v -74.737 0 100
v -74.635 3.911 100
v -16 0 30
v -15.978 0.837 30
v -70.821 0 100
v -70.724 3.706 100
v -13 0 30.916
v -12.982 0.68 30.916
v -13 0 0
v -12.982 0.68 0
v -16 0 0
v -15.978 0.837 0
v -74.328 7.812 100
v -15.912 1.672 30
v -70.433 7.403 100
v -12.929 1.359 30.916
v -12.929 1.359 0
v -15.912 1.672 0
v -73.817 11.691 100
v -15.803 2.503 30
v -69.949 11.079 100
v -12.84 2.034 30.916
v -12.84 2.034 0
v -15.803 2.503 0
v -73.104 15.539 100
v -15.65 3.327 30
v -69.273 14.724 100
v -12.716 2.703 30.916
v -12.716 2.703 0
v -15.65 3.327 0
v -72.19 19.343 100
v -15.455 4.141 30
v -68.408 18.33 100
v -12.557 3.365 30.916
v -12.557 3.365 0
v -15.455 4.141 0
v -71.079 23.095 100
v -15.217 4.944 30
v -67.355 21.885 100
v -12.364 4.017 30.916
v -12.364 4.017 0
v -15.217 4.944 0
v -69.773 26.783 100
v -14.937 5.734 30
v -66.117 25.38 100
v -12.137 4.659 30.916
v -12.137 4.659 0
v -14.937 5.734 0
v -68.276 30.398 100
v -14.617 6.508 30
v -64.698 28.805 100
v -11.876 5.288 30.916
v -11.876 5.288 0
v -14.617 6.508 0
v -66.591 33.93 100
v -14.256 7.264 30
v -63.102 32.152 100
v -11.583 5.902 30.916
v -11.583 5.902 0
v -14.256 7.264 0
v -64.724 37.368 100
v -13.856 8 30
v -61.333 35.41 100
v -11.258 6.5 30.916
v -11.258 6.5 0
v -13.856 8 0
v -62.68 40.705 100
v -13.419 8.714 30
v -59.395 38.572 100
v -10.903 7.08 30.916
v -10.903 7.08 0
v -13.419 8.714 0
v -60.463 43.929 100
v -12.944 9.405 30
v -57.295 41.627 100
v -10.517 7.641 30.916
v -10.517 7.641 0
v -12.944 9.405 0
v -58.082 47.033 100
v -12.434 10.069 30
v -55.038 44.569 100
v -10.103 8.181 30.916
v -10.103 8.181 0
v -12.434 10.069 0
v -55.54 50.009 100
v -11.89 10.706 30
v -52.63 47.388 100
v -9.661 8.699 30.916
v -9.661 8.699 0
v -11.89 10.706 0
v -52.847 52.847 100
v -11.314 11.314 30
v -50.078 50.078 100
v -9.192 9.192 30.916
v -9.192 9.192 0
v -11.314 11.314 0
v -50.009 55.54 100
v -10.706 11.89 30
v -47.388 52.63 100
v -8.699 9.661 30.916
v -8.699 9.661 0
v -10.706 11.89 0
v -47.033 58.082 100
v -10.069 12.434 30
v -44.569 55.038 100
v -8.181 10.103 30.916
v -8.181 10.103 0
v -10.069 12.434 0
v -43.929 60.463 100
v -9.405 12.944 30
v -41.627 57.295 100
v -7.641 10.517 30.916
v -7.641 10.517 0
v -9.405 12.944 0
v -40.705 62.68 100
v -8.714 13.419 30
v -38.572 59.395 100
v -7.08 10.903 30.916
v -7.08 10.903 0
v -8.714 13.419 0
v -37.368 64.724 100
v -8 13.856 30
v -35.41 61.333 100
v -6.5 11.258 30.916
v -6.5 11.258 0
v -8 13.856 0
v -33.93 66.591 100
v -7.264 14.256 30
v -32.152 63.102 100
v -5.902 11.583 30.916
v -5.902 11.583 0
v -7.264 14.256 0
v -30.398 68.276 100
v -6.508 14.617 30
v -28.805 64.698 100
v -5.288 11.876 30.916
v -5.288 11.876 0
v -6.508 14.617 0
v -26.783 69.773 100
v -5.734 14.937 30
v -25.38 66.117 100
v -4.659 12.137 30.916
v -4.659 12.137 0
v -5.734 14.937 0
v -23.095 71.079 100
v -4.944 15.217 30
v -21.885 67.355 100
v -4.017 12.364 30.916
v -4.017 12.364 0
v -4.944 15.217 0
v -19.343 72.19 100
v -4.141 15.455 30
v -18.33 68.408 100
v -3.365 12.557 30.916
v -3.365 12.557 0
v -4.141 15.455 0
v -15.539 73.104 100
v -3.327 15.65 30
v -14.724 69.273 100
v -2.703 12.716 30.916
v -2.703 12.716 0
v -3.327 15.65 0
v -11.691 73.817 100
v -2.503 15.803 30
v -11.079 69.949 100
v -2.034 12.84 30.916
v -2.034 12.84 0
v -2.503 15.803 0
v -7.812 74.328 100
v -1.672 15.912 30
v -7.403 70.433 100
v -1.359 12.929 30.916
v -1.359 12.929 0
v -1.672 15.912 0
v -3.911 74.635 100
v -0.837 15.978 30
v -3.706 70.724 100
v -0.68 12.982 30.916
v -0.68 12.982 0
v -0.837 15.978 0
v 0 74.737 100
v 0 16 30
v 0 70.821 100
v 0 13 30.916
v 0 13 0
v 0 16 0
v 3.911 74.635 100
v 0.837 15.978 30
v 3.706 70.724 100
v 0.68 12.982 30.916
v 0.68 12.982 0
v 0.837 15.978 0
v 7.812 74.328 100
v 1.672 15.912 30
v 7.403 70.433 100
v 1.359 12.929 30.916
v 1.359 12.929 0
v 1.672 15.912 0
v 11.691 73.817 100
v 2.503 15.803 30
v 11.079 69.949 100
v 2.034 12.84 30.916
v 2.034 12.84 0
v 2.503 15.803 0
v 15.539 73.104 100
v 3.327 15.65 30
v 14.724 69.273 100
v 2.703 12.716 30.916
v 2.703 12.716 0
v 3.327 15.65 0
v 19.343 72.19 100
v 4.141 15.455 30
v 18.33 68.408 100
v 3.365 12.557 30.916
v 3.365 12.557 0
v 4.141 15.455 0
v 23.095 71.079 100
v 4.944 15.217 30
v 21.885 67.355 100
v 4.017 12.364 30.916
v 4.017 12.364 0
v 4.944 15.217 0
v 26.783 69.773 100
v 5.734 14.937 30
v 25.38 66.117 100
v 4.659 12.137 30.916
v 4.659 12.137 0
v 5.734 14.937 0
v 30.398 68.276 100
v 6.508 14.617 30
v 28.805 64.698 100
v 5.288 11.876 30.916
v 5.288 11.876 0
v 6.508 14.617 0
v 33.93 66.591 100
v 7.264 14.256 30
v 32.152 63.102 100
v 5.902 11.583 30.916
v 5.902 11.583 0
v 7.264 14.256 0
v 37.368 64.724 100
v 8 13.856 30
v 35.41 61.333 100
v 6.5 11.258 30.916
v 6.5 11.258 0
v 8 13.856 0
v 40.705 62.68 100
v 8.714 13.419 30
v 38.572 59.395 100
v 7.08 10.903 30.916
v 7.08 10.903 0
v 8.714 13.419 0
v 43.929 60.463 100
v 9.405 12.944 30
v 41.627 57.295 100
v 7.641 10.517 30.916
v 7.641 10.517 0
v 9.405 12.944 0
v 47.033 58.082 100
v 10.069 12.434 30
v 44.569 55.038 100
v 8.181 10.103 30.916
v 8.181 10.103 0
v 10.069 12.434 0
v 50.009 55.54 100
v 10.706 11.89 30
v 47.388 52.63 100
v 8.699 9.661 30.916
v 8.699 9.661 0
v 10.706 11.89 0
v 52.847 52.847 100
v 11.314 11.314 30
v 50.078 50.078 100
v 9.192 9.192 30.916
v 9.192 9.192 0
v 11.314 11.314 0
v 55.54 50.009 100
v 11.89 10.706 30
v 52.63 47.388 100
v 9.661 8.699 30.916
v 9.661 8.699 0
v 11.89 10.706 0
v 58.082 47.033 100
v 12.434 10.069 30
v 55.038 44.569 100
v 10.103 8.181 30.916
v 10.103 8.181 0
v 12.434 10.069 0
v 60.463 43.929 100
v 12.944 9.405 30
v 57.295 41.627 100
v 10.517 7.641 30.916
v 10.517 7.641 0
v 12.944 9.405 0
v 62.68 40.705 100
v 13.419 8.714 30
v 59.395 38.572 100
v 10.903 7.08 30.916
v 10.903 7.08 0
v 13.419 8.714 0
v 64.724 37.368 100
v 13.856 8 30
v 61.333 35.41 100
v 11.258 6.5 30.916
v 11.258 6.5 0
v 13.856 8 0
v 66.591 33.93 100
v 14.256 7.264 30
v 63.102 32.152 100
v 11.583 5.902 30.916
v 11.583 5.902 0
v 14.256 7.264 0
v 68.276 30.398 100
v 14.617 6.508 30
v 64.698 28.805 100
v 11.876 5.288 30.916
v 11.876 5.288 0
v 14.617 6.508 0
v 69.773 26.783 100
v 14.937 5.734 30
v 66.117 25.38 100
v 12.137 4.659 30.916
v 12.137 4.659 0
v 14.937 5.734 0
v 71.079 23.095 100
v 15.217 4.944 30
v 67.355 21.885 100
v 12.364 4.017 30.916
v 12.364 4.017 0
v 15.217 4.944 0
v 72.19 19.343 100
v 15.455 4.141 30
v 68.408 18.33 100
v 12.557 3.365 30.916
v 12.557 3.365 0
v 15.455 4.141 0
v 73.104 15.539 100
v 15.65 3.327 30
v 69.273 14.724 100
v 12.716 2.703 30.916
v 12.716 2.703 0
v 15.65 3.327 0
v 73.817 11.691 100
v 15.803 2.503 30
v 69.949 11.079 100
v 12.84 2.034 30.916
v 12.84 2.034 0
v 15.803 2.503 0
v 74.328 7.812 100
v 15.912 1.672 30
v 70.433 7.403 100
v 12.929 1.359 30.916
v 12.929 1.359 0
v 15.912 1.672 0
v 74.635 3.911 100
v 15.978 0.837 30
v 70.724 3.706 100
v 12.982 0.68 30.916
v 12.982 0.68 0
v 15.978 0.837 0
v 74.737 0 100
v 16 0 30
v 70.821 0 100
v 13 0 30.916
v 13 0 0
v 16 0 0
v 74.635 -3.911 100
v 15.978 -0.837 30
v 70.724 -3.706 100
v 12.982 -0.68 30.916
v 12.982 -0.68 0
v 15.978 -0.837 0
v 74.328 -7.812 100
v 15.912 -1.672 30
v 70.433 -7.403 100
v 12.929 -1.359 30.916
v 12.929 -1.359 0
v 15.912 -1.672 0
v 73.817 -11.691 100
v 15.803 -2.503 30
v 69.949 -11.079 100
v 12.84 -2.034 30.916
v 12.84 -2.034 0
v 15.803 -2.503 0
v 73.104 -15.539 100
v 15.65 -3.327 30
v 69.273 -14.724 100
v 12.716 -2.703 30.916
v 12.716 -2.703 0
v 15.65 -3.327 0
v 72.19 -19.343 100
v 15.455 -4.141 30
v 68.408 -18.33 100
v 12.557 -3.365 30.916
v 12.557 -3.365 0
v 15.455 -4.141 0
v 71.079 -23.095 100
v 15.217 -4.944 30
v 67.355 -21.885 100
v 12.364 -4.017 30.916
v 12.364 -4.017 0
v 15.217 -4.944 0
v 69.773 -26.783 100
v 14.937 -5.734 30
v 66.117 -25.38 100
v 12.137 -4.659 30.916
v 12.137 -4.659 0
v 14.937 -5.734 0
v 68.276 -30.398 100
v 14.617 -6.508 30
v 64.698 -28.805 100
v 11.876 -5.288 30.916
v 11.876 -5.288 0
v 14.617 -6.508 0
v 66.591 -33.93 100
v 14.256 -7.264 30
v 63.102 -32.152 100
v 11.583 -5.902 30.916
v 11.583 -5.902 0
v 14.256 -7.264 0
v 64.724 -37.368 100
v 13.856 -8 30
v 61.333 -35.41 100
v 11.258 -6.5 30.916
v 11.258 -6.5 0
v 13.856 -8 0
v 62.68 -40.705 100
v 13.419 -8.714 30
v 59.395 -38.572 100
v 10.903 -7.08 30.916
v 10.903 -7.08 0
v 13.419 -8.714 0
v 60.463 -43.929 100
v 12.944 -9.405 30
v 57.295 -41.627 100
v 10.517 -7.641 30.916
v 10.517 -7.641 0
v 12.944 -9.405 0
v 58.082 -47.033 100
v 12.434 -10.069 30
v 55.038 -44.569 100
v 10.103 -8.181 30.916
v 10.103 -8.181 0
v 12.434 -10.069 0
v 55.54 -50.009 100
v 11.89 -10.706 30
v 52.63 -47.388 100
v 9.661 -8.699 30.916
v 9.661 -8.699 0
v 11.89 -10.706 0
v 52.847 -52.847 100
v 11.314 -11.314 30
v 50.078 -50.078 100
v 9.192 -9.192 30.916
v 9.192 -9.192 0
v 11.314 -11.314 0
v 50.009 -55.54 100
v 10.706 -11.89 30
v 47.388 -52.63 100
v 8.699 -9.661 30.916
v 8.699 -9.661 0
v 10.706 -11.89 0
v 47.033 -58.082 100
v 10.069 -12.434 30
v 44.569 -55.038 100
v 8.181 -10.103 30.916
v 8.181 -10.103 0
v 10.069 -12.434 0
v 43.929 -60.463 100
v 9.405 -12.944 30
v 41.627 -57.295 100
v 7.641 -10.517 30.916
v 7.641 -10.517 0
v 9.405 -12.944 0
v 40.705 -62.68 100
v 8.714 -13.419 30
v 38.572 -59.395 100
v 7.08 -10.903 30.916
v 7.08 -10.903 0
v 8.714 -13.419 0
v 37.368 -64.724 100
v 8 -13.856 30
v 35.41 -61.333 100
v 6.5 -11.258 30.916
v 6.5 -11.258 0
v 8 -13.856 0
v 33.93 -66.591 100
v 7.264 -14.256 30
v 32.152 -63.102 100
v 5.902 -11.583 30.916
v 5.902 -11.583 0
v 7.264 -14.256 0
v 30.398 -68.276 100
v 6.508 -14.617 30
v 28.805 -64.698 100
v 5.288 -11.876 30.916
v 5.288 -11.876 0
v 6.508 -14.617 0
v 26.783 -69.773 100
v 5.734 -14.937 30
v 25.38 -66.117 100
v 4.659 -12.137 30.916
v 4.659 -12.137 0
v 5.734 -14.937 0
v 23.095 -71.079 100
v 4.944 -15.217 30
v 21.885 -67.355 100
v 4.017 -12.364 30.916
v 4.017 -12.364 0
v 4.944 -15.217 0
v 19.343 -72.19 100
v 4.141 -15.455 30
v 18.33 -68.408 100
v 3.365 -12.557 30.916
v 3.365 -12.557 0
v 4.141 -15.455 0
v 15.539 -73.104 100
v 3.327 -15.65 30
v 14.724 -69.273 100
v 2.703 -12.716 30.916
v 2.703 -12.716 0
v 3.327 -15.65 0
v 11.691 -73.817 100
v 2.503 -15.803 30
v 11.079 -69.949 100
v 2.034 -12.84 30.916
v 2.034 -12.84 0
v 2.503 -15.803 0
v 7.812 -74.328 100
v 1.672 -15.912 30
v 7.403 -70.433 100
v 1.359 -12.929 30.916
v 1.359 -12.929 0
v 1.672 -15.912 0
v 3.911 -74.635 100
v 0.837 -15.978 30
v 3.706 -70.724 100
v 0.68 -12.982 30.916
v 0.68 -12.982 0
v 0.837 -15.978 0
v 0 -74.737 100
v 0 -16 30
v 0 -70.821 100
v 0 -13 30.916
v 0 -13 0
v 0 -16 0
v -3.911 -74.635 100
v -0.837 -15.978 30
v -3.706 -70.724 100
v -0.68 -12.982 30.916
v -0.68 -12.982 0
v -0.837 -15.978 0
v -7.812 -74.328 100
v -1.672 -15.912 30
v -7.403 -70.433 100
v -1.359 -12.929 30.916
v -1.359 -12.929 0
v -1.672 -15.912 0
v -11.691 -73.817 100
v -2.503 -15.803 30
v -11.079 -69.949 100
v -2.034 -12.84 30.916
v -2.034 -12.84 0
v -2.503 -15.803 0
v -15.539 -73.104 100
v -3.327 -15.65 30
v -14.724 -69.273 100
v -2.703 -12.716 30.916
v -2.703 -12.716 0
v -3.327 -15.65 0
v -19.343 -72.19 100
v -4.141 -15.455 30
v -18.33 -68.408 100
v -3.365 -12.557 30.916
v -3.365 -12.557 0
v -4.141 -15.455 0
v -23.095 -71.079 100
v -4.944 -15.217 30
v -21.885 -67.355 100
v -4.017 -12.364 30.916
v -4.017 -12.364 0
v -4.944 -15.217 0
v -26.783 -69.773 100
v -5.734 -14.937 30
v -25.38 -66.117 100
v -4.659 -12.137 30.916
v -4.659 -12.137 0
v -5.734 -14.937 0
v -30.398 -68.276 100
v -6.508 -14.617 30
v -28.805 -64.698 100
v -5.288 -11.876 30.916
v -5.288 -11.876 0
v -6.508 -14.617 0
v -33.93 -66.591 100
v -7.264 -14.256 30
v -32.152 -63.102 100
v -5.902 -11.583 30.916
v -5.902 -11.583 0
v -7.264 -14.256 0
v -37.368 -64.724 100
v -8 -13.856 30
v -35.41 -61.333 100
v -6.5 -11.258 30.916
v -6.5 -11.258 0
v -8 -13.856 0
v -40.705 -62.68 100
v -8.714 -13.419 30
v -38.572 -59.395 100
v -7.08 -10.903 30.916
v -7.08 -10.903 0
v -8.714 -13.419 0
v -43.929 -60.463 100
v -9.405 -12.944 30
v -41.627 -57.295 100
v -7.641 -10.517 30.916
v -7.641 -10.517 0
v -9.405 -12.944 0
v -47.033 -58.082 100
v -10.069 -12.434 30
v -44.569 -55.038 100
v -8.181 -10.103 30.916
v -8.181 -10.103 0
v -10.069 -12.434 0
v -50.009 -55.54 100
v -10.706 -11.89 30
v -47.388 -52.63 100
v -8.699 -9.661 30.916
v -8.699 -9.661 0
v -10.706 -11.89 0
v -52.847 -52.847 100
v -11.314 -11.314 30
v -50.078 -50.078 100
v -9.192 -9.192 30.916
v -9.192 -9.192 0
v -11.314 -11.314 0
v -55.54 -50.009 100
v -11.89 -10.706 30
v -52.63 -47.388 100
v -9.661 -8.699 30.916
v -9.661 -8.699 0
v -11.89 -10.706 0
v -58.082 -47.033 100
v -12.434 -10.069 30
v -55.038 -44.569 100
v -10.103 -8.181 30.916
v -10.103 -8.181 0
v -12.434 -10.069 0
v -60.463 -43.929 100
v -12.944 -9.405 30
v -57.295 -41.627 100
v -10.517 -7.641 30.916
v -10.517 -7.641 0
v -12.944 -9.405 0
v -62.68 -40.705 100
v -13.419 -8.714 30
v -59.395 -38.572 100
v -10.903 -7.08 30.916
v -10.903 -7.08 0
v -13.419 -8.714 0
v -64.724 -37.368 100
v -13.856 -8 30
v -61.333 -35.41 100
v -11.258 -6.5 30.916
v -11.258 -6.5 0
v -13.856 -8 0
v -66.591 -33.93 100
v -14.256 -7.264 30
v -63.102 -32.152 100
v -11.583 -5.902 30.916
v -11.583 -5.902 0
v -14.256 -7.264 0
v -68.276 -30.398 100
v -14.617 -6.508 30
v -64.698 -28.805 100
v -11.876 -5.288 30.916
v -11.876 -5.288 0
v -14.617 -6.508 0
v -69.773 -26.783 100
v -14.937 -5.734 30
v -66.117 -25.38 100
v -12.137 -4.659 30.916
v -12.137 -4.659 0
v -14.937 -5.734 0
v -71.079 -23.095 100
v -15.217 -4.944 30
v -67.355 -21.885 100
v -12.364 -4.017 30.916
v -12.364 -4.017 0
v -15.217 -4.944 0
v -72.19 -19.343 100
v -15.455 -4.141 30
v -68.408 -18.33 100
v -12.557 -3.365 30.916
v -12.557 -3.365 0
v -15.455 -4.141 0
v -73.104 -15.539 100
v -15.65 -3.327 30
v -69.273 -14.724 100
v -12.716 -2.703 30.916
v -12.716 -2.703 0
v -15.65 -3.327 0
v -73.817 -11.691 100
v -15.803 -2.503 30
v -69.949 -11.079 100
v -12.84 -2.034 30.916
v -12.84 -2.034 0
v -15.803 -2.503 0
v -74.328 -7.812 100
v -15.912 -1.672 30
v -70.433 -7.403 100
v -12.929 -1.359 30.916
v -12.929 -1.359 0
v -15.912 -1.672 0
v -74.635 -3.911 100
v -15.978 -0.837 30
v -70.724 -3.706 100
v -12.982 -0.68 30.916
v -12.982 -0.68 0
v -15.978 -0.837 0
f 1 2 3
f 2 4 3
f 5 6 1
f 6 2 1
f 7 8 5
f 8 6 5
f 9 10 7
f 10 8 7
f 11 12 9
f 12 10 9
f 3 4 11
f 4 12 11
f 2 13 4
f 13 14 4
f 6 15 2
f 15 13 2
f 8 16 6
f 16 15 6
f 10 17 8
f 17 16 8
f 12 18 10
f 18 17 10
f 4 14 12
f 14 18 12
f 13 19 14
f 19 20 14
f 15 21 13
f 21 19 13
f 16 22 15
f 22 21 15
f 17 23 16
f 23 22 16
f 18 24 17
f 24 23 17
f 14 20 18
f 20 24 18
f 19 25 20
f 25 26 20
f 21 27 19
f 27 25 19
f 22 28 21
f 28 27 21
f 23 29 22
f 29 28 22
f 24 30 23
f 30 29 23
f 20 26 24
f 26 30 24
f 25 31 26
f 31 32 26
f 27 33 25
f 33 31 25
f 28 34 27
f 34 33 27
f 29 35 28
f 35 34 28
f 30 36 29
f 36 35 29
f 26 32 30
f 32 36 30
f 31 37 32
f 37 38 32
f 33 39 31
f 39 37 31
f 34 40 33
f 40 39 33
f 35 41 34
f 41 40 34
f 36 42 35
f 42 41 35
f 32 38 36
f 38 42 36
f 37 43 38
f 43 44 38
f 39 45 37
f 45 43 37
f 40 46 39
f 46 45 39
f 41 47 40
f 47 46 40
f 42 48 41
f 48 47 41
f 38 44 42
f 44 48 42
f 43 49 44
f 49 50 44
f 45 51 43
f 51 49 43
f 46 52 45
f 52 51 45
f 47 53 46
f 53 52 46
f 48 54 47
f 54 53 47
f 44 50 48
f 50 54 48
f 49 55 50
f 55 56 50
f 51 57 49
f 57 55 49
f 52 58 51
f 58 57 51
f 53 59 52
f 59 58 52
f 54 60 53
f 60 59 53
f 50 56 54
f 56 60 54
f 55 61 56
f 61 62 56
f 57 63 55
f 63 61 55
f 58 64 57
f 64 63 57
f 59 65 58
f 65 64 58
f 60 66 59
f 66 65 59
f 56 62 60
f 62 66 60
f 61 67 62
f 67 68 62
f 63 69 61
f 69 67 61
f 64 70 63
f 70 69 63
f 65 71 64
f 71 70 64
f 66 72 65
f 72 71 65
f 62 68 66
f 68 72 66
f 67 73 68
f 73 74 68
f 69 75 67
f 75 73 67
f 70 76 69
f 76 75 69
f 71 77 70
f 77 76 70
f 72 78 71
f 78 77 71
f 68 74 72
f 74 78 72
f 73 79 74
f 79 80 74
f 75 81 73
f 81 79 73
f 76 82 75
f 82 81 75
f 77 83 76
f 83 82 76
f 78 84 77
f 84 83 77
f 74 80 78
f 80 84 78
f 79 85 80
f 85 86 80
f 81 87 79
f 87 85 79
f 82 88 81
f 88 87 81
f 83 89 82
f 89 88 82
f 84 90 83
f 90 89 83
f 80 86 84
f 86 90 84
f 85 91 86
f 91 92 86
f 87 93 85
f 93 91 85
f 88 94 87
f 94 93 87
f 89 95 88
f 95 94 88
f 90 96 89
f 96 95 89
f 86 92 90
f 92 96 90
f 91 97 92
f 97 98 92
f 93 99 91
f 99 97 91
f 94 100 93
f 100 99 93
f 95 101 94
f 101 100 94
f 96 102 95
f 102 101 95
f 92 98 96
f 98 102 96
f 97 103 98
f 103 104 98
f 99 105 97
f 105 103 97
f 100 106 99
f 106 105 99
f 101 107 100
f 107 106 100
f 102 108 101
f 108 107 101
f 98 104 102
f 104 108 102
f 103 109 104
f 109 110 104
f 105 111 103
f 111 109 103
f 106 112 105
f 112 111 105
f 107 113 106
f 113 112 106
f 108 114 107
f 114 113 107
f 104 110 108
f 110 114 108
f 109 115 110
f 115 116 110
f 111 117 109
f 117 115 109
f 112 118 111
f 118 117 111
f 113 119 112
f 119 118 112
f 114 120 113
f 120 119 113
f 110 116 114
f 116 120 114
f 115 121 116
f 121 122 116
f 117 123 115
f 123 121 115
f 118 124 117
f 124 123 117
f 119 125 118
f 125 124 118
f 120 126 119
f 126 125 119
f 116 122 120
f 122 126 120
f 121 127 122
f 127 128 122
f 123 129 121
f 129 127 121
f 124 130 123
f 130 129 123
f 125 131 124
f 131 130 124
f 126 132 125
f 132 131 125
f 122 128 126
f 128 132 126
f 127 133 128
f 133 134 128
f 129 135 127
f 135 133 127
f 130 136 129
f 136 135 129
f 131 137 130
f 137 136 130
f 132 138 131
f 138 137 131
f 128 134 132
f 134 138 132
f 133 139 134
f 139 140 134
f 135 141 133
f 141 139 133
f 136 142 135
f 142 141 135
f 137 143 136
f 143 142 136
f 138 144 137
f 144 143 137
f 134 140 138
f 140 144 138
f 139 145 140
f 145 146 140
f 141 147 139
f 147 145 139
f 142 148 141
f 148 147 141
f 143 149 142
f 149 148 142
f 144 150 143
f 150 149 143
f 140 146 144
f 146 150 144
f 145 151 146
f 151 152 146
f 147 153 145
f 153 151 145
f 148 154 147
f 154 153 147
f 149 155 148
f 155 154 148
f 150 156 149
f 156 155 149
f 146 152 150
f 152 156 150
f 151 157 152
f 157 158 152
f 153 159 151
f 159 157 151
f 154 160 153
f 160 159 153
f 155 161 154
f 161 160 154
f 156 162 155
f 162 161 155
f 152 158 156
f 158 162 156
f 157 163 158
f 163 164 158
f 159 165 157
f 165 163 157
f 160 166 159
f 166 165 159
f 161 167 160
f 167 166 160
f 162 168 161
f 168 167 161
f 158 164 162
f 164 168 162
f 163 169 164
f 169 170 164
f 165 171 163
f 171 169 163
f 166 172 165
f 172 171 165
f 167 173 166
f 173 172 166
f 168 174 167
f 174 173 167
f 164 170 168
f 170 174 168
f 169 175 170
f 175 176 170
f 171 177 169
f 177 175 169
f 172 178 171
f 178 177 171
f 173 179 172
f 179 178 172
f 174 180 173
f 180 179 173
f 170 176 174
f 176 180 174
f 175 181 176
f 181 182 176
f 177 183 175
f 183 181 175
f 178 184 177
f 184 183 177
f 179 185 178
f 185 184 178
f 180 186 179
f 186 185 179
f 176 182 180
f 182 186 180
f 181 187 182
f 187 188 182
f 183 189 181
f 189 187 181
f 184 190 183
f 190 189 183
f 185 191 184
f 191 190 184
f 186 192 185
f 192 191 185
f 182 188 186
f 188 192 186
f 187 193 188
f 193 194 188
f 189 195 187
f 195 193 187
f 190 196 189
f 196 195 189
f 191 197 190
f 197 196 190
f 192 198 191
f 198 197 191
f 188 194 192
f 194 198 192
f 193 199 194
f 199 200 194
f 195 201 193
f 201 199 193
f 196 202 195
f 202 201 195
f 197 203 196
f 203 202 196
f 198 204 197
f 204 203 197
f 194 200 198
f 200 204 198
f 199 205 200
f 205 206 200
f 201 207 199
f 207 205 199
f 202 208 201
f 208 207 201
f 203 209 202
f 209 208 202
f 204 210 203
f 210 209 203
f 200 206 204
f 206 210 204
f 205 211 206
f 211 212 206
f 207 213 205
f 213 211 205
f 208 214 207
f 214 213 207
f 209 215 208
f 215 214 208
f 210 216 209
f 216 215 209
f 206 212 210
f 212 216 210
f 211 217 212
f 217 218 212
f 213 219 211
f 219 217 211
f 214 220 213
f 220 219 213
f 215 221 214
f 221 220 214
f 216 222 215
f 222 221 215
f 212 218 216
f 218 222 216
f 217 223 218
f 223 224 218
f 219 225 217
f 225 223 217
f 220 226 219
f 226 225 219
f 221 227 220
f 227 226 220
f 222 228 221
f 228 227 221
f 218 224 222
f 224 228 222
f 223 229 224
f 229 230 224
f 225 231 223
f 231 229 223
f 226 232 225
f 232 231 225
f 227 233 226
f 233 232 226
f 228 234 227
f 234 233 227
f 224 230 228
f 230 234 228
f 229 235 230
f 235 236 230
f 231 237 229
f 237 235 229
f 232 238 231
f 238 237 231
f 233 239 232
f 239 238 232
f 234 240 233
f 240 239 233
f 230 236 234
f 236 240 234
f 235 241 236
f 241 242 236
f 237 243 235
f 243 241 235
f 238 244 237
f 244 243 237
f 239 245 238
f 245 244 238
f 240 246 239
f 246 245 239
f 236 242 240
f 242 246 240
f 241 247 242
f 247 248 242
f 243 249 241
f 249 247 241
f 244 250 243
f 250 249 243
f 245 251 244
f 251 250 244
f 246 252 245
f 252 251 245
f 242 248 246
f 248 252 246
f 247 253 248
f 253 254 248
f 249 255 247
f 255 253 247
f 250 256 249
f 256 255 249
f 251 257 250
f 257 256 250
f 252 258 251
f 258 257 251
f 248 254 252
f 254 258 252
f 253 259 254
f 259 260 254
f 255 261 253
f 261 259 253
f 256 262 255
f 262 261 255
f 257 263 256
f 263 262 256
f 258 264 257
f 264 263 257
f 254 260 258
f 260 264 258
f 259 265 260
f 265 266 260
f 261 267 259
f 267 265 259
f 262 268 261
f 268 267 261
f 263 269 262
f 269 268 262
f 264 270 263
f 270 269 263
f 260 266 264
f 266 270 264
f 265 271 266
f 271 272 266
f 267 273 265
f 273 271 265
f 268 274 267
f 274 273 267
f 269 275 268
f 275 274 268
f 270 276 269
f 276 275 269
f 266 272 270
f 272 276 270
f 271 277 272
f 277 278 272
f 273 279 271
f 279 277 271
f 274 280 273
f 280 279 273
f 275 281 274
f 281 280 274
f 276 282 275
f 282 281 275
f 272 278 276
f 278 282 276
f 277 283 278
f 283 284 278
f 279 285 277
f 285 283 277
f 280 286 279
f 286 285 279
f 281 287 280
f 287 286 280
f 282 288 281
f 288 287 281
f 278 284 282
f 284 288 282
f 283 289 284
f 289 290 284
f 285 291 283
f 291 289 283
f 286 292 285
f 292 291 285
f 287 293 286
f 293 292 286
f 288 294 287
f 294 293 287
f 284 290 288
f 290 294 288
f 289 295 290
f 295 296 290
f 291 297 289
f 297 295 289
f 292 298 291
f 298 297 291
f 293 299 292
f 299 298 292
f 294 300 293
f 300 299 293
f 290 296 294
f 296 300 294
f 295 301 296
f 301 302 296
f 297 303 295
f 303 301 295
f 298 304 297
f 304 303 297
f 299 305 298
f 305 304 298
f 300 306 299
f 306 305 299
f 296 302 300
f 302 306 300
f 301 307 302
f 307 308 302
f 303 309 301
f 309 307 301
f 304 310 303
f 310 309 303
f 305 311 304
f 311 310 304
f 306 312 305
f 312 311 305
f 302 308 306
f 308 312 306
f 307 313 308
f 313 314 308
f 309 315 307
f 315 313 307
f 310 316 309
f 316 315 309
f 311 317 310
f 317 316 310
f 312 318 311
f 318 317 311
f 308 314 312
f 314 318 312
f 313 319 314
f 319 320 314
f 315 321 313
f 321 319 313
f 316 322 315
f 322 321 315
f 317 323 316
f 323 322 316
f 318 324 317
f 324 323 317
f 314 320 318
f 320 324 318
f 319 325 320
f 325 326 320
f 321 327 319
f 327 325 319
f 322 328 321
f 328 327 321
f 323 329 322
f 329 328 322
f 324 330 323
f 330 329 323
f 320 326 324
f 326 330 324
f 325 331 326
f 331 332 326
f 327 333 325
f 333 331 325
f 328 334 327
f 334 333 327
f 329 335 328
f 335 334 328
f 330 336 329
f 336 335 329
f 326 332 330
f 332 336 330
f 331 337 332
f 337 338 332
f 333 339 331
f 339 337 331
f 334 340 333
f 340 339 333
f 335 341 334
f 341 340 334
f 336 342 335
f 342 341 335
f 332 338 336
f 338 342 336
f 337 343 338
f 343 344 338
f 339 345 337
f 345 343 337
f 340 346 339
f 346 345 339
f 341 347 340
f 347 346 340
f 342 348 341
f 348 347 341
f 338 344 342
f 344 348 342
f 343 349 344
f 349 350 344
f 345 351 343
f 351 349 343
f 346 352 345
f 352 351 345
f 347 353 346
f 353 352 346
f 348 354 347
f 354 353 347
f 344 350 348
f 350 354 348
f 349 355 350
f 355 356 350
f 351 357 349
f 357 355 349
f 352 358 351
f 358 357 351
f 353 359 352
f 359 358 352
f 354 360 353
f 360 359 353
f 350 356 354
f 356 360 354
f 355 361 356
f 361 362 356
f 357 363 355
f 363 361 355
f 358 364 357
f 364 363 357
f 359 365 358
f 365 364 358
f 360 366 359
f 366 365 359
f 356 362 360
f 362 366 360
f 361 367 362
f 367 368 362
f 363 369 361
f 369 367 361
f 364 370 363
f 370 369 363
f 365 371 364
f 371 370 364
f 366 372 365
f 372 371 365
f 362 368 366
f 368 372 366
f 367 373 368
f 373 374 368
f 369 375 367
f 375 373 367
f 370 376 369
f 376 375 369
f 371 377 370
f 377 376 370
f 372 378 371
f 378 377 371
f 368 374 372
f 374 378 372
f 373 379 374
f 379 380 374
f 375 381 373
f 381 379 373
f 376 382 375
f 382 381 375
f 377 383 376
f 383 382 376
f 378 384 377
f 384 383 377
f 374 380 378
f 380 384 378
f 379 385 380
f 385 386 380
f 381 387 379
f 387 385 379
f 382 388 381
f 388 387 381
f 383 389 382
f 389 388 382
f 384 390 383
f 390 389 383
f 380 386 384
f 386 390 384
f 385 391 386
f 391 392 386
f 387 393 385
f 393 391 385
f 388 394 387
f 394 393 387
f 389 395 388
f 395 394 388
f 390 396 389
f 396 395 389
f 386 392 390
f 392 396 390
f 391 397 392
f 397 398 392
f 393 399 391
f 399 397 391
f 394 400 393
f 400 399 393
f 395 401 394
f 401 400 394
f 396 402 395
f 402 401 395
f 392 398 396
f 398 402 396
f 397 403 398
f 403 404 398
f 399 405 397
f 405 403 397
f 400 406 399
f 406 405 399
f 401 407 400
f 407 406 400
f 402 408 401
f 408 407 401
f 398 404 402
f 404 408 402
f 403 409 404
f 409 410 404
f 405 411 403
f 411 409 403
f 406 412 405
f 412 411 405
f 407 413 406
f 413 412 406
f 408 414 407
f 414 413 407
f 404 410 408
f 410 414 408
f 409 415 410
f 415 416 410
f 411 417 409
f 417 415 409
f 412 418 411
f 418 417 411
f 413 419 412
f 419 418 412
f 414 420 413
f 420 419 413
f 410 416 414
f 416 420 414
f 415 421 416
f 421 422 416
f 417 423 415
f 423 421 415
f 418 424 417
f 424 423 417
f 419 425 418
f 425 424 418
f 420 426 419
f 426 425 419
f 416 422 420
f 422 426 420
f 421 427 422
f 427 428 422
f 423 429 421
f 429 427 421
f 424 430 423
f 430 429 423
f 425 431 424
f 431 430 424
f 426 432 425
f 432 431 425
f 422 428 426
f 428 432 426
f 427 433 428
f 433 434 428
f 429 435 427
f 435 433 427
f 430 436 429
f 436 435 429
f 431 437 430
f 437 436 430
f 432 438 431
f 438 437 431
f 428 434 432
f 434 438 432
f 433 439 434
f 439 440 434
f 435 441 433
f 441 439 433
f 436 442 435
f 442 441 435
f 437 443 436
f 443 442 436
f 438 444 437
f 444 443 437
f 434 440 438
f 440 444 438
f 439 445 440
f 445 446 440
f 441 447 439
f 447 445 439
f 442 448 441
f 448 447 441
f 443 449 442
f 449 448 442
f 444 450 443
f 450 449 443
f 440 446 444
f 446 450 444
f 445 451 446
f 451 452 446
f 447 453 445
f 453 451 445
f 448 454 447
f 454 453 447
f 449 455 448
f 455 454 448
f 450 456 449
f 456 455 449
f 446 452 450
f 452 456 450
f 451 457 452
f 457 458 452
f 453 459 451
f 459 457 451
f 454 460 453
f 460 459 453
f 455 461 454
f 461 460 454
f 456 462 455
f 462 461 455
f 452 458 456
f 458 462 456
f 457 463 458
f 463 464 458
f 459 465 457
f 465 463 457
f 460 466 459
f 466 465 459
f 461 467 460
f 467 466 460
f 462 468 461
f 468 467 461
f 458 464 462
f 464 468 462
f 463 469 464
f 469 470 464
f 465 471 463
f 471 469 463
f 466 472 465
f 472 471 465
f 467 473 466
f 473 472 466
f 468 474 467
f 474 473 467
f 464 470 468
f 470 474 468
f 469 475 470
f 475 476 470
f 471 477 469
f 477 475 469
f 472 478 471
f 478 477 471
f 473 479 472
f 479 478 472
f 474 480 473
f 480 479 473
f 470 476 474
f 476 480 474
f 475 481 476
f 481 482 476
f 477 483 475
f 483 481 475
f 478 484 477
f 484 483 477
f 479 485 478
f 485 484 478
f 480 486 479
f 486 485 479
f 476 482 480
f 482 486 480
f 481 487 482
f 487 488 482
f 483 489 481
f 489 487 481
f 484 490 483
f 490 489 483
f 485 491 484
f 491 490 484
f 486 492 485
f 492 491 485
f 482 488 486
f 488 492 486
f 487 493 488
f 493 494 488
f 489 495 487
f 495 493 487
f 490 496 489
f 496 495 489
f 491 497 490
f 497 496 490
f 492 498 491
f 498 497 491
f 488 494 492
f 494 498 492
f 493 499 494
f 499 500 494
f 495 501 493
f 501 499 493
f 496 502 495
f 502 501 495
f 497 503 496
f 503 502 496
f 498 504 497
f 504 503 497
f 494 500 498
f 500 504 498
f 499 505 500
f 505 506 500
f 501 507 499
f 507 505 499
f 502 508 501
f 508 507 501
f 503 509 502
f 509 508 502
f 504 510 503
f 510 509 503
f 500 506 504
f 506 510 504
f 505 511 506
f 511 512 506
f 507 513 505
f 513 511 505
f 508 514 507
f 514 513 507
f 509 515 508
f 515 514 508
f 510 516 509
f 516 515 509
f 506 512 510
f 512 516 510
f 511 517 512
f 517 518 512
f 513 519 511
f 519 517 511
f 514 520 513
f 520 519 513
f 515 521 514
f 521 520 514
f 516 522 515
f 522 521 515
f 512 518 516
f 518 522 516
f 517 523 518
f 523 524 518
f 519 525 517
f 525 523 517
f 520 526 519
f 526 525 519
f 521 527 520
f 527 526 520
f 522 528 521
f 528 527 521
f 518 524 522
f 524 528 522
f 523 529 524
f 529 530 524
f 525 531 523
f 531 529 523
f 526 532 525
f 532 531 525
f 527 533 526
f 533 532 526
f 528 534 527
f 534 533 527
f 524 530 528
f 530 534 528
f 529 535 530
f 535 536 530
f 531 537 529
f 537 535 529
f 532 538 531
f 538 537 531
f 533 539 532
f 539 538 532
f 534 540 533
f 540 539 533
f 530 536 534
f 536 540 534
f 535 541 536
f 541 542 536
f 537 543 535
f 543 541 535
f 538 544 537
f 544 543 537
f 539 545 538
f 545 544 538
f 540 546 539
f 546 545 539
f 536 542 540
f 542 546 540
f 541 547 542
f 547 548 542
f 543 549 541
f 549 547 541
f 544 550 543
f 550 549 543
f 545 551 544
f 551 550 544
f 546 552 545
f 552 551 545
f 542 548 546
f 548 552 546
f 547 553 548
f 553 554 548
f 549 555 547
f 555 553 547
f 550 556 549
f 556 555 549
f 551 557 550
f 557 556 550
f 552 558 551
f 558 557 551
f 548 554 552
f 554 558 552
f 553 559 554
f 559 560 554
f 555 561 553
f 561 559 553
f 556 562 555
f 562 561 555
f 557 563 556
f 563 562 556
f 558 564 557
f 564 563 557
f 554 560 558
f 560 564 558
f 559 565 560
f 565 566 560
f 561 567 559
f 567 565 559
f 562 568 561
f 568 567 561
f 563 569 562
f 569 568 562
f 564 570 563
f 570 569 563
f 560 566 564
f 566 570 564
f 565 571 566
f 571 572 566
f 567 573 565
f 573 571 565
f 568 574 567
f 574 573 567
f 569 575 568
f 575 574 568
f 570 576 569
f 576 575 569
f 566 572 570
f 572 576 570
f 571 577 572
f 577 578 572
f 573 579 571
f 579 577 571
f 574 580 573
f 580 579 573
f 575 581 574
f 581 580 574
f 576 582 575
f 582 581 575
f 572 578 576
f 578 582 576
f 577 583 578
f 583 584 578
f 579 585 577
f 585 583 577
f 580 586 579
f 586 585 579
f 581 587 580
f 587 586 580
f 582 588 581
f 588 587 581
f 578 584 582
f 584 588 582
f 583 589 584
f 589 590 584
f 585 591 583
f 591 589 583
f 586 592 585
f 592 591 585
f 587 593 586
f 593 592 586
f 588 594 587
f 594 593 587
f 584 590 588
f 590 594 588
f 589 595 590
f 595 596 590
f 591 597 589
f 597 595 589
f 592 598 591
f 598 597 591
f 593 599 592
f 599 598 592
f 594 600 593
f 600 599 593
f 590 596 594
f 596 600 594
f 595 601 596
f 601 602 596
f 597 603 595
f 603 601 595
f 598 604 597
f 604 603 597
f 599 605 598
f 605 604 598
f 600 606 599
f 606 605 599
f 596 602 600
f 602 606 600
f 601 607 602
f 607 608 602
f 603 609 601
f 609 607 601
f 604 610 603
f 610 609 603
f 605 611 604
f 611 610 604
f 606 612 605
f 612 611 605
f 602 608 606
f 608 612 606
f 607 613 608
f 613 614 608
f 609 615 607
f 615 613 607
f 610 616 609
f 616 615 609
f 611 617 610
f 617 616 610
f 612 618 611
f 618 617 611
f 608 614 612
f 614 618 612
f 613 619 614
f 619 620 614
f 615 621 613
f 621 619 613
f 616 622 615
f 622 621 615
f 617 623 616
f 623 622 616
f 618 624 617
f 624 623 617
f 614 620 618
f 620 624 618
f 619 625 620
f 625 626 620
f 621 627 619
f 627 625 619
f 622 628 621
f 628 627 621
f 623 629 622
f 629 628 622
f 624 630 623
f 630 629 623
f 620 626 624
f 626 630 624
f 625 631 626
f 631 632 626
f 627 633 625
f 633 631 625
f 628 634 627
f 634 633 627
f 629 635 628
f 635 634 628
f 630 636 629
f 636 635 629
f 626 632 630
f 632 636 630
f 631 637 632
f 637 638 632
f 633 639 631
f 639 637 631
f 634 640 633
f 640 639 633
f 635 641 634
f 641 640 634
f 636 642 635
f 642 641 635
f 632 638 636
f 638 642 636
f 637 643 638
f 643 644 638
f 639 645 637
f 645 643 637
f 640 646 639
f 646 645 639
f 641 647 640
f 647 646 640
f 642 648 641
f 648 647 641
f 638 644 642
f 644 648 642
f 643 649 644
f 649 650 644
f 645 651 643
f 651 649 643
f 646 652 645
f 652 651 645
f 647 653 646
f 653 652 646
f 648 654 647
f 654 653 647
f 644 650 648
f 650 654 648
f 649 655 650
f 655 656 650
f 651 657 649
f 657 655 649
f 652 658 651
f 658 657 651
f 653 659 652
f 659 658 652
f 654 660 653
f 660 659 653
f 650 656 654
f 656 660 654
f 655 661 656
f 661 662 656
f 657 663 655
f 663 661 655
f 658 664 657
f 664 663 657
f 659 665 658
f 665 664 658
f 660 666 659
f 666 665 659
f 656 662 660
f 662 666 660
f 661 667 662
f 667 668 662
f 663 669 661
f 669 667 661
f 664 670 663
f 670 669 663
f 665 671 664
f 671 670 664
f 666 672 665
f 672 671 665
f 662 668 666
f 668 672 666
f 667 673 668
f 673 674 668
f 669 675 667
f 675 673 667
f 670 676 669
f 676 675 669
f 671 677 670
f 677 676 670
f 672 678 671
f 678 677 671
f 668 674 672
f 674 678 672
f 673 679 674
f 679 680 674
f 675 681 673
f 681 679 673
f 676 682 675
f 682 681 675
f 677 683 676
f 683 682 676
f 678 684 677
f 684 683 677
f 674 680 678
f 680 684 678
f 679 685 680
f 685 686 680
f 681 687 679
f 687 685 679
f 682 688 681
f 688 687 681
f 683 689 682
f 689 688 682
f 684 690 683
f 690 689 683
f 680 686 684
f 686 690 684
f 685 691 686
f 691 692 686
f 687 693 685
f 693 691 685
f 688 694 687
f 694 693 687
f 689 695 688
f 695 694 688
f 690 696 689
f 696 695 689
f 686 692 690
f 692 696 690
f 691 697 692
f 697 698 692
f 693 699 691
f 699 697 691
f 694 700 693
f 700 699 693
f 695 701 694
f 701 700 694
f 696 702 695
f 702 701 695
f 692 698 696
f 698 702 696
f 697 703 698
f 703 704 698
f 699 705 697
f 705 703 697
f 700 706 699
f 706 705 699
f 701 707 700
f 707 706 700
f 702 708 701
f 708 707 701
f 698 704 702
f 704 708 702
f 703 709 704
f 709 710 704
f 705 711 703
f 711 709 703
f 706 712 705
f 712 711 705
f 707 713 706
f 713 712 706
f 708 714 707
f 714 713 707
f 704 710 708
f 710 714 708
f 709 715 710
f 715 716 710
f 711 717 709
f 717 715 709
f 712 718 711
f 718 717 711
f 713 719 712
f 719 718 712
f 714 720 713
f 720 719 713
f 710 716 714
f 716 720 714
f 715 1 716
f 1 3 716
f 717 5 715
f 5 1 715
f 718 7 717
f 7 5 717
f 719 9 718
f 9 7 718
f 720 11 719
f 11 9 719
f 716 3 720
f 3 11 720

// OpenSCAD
hc=70; // cone surpluss height
ac=50; // cone angle from x-axis / ccw
xc=hc/tan(ac); //cone width

dt=32; // tube outer diameter
lt=30; // tube length

tw=3; // wall thickness
xw=tw/sin(ac); // cone wall x-dir thickness

echo(str("Cone Diameter = ",dt+2*xc));
echo(str("Funnel Height = ",lt+hc));

rotate_extrude(angle = 360, convexity = 2, $fn = 120)
{
    polygon([
        [dt/2-tw   ,       0],
        [dt/2      ,       0],
        [dt/2      ,lt      ],
        [dt/2+xc   ,lt   +hc],
        [dt/2+xc-xw,lt   +hc],
        [dt/2-tw   ,lt+xw-tw]],
        paths=[[0,1,2,3,4,5]]);
};
